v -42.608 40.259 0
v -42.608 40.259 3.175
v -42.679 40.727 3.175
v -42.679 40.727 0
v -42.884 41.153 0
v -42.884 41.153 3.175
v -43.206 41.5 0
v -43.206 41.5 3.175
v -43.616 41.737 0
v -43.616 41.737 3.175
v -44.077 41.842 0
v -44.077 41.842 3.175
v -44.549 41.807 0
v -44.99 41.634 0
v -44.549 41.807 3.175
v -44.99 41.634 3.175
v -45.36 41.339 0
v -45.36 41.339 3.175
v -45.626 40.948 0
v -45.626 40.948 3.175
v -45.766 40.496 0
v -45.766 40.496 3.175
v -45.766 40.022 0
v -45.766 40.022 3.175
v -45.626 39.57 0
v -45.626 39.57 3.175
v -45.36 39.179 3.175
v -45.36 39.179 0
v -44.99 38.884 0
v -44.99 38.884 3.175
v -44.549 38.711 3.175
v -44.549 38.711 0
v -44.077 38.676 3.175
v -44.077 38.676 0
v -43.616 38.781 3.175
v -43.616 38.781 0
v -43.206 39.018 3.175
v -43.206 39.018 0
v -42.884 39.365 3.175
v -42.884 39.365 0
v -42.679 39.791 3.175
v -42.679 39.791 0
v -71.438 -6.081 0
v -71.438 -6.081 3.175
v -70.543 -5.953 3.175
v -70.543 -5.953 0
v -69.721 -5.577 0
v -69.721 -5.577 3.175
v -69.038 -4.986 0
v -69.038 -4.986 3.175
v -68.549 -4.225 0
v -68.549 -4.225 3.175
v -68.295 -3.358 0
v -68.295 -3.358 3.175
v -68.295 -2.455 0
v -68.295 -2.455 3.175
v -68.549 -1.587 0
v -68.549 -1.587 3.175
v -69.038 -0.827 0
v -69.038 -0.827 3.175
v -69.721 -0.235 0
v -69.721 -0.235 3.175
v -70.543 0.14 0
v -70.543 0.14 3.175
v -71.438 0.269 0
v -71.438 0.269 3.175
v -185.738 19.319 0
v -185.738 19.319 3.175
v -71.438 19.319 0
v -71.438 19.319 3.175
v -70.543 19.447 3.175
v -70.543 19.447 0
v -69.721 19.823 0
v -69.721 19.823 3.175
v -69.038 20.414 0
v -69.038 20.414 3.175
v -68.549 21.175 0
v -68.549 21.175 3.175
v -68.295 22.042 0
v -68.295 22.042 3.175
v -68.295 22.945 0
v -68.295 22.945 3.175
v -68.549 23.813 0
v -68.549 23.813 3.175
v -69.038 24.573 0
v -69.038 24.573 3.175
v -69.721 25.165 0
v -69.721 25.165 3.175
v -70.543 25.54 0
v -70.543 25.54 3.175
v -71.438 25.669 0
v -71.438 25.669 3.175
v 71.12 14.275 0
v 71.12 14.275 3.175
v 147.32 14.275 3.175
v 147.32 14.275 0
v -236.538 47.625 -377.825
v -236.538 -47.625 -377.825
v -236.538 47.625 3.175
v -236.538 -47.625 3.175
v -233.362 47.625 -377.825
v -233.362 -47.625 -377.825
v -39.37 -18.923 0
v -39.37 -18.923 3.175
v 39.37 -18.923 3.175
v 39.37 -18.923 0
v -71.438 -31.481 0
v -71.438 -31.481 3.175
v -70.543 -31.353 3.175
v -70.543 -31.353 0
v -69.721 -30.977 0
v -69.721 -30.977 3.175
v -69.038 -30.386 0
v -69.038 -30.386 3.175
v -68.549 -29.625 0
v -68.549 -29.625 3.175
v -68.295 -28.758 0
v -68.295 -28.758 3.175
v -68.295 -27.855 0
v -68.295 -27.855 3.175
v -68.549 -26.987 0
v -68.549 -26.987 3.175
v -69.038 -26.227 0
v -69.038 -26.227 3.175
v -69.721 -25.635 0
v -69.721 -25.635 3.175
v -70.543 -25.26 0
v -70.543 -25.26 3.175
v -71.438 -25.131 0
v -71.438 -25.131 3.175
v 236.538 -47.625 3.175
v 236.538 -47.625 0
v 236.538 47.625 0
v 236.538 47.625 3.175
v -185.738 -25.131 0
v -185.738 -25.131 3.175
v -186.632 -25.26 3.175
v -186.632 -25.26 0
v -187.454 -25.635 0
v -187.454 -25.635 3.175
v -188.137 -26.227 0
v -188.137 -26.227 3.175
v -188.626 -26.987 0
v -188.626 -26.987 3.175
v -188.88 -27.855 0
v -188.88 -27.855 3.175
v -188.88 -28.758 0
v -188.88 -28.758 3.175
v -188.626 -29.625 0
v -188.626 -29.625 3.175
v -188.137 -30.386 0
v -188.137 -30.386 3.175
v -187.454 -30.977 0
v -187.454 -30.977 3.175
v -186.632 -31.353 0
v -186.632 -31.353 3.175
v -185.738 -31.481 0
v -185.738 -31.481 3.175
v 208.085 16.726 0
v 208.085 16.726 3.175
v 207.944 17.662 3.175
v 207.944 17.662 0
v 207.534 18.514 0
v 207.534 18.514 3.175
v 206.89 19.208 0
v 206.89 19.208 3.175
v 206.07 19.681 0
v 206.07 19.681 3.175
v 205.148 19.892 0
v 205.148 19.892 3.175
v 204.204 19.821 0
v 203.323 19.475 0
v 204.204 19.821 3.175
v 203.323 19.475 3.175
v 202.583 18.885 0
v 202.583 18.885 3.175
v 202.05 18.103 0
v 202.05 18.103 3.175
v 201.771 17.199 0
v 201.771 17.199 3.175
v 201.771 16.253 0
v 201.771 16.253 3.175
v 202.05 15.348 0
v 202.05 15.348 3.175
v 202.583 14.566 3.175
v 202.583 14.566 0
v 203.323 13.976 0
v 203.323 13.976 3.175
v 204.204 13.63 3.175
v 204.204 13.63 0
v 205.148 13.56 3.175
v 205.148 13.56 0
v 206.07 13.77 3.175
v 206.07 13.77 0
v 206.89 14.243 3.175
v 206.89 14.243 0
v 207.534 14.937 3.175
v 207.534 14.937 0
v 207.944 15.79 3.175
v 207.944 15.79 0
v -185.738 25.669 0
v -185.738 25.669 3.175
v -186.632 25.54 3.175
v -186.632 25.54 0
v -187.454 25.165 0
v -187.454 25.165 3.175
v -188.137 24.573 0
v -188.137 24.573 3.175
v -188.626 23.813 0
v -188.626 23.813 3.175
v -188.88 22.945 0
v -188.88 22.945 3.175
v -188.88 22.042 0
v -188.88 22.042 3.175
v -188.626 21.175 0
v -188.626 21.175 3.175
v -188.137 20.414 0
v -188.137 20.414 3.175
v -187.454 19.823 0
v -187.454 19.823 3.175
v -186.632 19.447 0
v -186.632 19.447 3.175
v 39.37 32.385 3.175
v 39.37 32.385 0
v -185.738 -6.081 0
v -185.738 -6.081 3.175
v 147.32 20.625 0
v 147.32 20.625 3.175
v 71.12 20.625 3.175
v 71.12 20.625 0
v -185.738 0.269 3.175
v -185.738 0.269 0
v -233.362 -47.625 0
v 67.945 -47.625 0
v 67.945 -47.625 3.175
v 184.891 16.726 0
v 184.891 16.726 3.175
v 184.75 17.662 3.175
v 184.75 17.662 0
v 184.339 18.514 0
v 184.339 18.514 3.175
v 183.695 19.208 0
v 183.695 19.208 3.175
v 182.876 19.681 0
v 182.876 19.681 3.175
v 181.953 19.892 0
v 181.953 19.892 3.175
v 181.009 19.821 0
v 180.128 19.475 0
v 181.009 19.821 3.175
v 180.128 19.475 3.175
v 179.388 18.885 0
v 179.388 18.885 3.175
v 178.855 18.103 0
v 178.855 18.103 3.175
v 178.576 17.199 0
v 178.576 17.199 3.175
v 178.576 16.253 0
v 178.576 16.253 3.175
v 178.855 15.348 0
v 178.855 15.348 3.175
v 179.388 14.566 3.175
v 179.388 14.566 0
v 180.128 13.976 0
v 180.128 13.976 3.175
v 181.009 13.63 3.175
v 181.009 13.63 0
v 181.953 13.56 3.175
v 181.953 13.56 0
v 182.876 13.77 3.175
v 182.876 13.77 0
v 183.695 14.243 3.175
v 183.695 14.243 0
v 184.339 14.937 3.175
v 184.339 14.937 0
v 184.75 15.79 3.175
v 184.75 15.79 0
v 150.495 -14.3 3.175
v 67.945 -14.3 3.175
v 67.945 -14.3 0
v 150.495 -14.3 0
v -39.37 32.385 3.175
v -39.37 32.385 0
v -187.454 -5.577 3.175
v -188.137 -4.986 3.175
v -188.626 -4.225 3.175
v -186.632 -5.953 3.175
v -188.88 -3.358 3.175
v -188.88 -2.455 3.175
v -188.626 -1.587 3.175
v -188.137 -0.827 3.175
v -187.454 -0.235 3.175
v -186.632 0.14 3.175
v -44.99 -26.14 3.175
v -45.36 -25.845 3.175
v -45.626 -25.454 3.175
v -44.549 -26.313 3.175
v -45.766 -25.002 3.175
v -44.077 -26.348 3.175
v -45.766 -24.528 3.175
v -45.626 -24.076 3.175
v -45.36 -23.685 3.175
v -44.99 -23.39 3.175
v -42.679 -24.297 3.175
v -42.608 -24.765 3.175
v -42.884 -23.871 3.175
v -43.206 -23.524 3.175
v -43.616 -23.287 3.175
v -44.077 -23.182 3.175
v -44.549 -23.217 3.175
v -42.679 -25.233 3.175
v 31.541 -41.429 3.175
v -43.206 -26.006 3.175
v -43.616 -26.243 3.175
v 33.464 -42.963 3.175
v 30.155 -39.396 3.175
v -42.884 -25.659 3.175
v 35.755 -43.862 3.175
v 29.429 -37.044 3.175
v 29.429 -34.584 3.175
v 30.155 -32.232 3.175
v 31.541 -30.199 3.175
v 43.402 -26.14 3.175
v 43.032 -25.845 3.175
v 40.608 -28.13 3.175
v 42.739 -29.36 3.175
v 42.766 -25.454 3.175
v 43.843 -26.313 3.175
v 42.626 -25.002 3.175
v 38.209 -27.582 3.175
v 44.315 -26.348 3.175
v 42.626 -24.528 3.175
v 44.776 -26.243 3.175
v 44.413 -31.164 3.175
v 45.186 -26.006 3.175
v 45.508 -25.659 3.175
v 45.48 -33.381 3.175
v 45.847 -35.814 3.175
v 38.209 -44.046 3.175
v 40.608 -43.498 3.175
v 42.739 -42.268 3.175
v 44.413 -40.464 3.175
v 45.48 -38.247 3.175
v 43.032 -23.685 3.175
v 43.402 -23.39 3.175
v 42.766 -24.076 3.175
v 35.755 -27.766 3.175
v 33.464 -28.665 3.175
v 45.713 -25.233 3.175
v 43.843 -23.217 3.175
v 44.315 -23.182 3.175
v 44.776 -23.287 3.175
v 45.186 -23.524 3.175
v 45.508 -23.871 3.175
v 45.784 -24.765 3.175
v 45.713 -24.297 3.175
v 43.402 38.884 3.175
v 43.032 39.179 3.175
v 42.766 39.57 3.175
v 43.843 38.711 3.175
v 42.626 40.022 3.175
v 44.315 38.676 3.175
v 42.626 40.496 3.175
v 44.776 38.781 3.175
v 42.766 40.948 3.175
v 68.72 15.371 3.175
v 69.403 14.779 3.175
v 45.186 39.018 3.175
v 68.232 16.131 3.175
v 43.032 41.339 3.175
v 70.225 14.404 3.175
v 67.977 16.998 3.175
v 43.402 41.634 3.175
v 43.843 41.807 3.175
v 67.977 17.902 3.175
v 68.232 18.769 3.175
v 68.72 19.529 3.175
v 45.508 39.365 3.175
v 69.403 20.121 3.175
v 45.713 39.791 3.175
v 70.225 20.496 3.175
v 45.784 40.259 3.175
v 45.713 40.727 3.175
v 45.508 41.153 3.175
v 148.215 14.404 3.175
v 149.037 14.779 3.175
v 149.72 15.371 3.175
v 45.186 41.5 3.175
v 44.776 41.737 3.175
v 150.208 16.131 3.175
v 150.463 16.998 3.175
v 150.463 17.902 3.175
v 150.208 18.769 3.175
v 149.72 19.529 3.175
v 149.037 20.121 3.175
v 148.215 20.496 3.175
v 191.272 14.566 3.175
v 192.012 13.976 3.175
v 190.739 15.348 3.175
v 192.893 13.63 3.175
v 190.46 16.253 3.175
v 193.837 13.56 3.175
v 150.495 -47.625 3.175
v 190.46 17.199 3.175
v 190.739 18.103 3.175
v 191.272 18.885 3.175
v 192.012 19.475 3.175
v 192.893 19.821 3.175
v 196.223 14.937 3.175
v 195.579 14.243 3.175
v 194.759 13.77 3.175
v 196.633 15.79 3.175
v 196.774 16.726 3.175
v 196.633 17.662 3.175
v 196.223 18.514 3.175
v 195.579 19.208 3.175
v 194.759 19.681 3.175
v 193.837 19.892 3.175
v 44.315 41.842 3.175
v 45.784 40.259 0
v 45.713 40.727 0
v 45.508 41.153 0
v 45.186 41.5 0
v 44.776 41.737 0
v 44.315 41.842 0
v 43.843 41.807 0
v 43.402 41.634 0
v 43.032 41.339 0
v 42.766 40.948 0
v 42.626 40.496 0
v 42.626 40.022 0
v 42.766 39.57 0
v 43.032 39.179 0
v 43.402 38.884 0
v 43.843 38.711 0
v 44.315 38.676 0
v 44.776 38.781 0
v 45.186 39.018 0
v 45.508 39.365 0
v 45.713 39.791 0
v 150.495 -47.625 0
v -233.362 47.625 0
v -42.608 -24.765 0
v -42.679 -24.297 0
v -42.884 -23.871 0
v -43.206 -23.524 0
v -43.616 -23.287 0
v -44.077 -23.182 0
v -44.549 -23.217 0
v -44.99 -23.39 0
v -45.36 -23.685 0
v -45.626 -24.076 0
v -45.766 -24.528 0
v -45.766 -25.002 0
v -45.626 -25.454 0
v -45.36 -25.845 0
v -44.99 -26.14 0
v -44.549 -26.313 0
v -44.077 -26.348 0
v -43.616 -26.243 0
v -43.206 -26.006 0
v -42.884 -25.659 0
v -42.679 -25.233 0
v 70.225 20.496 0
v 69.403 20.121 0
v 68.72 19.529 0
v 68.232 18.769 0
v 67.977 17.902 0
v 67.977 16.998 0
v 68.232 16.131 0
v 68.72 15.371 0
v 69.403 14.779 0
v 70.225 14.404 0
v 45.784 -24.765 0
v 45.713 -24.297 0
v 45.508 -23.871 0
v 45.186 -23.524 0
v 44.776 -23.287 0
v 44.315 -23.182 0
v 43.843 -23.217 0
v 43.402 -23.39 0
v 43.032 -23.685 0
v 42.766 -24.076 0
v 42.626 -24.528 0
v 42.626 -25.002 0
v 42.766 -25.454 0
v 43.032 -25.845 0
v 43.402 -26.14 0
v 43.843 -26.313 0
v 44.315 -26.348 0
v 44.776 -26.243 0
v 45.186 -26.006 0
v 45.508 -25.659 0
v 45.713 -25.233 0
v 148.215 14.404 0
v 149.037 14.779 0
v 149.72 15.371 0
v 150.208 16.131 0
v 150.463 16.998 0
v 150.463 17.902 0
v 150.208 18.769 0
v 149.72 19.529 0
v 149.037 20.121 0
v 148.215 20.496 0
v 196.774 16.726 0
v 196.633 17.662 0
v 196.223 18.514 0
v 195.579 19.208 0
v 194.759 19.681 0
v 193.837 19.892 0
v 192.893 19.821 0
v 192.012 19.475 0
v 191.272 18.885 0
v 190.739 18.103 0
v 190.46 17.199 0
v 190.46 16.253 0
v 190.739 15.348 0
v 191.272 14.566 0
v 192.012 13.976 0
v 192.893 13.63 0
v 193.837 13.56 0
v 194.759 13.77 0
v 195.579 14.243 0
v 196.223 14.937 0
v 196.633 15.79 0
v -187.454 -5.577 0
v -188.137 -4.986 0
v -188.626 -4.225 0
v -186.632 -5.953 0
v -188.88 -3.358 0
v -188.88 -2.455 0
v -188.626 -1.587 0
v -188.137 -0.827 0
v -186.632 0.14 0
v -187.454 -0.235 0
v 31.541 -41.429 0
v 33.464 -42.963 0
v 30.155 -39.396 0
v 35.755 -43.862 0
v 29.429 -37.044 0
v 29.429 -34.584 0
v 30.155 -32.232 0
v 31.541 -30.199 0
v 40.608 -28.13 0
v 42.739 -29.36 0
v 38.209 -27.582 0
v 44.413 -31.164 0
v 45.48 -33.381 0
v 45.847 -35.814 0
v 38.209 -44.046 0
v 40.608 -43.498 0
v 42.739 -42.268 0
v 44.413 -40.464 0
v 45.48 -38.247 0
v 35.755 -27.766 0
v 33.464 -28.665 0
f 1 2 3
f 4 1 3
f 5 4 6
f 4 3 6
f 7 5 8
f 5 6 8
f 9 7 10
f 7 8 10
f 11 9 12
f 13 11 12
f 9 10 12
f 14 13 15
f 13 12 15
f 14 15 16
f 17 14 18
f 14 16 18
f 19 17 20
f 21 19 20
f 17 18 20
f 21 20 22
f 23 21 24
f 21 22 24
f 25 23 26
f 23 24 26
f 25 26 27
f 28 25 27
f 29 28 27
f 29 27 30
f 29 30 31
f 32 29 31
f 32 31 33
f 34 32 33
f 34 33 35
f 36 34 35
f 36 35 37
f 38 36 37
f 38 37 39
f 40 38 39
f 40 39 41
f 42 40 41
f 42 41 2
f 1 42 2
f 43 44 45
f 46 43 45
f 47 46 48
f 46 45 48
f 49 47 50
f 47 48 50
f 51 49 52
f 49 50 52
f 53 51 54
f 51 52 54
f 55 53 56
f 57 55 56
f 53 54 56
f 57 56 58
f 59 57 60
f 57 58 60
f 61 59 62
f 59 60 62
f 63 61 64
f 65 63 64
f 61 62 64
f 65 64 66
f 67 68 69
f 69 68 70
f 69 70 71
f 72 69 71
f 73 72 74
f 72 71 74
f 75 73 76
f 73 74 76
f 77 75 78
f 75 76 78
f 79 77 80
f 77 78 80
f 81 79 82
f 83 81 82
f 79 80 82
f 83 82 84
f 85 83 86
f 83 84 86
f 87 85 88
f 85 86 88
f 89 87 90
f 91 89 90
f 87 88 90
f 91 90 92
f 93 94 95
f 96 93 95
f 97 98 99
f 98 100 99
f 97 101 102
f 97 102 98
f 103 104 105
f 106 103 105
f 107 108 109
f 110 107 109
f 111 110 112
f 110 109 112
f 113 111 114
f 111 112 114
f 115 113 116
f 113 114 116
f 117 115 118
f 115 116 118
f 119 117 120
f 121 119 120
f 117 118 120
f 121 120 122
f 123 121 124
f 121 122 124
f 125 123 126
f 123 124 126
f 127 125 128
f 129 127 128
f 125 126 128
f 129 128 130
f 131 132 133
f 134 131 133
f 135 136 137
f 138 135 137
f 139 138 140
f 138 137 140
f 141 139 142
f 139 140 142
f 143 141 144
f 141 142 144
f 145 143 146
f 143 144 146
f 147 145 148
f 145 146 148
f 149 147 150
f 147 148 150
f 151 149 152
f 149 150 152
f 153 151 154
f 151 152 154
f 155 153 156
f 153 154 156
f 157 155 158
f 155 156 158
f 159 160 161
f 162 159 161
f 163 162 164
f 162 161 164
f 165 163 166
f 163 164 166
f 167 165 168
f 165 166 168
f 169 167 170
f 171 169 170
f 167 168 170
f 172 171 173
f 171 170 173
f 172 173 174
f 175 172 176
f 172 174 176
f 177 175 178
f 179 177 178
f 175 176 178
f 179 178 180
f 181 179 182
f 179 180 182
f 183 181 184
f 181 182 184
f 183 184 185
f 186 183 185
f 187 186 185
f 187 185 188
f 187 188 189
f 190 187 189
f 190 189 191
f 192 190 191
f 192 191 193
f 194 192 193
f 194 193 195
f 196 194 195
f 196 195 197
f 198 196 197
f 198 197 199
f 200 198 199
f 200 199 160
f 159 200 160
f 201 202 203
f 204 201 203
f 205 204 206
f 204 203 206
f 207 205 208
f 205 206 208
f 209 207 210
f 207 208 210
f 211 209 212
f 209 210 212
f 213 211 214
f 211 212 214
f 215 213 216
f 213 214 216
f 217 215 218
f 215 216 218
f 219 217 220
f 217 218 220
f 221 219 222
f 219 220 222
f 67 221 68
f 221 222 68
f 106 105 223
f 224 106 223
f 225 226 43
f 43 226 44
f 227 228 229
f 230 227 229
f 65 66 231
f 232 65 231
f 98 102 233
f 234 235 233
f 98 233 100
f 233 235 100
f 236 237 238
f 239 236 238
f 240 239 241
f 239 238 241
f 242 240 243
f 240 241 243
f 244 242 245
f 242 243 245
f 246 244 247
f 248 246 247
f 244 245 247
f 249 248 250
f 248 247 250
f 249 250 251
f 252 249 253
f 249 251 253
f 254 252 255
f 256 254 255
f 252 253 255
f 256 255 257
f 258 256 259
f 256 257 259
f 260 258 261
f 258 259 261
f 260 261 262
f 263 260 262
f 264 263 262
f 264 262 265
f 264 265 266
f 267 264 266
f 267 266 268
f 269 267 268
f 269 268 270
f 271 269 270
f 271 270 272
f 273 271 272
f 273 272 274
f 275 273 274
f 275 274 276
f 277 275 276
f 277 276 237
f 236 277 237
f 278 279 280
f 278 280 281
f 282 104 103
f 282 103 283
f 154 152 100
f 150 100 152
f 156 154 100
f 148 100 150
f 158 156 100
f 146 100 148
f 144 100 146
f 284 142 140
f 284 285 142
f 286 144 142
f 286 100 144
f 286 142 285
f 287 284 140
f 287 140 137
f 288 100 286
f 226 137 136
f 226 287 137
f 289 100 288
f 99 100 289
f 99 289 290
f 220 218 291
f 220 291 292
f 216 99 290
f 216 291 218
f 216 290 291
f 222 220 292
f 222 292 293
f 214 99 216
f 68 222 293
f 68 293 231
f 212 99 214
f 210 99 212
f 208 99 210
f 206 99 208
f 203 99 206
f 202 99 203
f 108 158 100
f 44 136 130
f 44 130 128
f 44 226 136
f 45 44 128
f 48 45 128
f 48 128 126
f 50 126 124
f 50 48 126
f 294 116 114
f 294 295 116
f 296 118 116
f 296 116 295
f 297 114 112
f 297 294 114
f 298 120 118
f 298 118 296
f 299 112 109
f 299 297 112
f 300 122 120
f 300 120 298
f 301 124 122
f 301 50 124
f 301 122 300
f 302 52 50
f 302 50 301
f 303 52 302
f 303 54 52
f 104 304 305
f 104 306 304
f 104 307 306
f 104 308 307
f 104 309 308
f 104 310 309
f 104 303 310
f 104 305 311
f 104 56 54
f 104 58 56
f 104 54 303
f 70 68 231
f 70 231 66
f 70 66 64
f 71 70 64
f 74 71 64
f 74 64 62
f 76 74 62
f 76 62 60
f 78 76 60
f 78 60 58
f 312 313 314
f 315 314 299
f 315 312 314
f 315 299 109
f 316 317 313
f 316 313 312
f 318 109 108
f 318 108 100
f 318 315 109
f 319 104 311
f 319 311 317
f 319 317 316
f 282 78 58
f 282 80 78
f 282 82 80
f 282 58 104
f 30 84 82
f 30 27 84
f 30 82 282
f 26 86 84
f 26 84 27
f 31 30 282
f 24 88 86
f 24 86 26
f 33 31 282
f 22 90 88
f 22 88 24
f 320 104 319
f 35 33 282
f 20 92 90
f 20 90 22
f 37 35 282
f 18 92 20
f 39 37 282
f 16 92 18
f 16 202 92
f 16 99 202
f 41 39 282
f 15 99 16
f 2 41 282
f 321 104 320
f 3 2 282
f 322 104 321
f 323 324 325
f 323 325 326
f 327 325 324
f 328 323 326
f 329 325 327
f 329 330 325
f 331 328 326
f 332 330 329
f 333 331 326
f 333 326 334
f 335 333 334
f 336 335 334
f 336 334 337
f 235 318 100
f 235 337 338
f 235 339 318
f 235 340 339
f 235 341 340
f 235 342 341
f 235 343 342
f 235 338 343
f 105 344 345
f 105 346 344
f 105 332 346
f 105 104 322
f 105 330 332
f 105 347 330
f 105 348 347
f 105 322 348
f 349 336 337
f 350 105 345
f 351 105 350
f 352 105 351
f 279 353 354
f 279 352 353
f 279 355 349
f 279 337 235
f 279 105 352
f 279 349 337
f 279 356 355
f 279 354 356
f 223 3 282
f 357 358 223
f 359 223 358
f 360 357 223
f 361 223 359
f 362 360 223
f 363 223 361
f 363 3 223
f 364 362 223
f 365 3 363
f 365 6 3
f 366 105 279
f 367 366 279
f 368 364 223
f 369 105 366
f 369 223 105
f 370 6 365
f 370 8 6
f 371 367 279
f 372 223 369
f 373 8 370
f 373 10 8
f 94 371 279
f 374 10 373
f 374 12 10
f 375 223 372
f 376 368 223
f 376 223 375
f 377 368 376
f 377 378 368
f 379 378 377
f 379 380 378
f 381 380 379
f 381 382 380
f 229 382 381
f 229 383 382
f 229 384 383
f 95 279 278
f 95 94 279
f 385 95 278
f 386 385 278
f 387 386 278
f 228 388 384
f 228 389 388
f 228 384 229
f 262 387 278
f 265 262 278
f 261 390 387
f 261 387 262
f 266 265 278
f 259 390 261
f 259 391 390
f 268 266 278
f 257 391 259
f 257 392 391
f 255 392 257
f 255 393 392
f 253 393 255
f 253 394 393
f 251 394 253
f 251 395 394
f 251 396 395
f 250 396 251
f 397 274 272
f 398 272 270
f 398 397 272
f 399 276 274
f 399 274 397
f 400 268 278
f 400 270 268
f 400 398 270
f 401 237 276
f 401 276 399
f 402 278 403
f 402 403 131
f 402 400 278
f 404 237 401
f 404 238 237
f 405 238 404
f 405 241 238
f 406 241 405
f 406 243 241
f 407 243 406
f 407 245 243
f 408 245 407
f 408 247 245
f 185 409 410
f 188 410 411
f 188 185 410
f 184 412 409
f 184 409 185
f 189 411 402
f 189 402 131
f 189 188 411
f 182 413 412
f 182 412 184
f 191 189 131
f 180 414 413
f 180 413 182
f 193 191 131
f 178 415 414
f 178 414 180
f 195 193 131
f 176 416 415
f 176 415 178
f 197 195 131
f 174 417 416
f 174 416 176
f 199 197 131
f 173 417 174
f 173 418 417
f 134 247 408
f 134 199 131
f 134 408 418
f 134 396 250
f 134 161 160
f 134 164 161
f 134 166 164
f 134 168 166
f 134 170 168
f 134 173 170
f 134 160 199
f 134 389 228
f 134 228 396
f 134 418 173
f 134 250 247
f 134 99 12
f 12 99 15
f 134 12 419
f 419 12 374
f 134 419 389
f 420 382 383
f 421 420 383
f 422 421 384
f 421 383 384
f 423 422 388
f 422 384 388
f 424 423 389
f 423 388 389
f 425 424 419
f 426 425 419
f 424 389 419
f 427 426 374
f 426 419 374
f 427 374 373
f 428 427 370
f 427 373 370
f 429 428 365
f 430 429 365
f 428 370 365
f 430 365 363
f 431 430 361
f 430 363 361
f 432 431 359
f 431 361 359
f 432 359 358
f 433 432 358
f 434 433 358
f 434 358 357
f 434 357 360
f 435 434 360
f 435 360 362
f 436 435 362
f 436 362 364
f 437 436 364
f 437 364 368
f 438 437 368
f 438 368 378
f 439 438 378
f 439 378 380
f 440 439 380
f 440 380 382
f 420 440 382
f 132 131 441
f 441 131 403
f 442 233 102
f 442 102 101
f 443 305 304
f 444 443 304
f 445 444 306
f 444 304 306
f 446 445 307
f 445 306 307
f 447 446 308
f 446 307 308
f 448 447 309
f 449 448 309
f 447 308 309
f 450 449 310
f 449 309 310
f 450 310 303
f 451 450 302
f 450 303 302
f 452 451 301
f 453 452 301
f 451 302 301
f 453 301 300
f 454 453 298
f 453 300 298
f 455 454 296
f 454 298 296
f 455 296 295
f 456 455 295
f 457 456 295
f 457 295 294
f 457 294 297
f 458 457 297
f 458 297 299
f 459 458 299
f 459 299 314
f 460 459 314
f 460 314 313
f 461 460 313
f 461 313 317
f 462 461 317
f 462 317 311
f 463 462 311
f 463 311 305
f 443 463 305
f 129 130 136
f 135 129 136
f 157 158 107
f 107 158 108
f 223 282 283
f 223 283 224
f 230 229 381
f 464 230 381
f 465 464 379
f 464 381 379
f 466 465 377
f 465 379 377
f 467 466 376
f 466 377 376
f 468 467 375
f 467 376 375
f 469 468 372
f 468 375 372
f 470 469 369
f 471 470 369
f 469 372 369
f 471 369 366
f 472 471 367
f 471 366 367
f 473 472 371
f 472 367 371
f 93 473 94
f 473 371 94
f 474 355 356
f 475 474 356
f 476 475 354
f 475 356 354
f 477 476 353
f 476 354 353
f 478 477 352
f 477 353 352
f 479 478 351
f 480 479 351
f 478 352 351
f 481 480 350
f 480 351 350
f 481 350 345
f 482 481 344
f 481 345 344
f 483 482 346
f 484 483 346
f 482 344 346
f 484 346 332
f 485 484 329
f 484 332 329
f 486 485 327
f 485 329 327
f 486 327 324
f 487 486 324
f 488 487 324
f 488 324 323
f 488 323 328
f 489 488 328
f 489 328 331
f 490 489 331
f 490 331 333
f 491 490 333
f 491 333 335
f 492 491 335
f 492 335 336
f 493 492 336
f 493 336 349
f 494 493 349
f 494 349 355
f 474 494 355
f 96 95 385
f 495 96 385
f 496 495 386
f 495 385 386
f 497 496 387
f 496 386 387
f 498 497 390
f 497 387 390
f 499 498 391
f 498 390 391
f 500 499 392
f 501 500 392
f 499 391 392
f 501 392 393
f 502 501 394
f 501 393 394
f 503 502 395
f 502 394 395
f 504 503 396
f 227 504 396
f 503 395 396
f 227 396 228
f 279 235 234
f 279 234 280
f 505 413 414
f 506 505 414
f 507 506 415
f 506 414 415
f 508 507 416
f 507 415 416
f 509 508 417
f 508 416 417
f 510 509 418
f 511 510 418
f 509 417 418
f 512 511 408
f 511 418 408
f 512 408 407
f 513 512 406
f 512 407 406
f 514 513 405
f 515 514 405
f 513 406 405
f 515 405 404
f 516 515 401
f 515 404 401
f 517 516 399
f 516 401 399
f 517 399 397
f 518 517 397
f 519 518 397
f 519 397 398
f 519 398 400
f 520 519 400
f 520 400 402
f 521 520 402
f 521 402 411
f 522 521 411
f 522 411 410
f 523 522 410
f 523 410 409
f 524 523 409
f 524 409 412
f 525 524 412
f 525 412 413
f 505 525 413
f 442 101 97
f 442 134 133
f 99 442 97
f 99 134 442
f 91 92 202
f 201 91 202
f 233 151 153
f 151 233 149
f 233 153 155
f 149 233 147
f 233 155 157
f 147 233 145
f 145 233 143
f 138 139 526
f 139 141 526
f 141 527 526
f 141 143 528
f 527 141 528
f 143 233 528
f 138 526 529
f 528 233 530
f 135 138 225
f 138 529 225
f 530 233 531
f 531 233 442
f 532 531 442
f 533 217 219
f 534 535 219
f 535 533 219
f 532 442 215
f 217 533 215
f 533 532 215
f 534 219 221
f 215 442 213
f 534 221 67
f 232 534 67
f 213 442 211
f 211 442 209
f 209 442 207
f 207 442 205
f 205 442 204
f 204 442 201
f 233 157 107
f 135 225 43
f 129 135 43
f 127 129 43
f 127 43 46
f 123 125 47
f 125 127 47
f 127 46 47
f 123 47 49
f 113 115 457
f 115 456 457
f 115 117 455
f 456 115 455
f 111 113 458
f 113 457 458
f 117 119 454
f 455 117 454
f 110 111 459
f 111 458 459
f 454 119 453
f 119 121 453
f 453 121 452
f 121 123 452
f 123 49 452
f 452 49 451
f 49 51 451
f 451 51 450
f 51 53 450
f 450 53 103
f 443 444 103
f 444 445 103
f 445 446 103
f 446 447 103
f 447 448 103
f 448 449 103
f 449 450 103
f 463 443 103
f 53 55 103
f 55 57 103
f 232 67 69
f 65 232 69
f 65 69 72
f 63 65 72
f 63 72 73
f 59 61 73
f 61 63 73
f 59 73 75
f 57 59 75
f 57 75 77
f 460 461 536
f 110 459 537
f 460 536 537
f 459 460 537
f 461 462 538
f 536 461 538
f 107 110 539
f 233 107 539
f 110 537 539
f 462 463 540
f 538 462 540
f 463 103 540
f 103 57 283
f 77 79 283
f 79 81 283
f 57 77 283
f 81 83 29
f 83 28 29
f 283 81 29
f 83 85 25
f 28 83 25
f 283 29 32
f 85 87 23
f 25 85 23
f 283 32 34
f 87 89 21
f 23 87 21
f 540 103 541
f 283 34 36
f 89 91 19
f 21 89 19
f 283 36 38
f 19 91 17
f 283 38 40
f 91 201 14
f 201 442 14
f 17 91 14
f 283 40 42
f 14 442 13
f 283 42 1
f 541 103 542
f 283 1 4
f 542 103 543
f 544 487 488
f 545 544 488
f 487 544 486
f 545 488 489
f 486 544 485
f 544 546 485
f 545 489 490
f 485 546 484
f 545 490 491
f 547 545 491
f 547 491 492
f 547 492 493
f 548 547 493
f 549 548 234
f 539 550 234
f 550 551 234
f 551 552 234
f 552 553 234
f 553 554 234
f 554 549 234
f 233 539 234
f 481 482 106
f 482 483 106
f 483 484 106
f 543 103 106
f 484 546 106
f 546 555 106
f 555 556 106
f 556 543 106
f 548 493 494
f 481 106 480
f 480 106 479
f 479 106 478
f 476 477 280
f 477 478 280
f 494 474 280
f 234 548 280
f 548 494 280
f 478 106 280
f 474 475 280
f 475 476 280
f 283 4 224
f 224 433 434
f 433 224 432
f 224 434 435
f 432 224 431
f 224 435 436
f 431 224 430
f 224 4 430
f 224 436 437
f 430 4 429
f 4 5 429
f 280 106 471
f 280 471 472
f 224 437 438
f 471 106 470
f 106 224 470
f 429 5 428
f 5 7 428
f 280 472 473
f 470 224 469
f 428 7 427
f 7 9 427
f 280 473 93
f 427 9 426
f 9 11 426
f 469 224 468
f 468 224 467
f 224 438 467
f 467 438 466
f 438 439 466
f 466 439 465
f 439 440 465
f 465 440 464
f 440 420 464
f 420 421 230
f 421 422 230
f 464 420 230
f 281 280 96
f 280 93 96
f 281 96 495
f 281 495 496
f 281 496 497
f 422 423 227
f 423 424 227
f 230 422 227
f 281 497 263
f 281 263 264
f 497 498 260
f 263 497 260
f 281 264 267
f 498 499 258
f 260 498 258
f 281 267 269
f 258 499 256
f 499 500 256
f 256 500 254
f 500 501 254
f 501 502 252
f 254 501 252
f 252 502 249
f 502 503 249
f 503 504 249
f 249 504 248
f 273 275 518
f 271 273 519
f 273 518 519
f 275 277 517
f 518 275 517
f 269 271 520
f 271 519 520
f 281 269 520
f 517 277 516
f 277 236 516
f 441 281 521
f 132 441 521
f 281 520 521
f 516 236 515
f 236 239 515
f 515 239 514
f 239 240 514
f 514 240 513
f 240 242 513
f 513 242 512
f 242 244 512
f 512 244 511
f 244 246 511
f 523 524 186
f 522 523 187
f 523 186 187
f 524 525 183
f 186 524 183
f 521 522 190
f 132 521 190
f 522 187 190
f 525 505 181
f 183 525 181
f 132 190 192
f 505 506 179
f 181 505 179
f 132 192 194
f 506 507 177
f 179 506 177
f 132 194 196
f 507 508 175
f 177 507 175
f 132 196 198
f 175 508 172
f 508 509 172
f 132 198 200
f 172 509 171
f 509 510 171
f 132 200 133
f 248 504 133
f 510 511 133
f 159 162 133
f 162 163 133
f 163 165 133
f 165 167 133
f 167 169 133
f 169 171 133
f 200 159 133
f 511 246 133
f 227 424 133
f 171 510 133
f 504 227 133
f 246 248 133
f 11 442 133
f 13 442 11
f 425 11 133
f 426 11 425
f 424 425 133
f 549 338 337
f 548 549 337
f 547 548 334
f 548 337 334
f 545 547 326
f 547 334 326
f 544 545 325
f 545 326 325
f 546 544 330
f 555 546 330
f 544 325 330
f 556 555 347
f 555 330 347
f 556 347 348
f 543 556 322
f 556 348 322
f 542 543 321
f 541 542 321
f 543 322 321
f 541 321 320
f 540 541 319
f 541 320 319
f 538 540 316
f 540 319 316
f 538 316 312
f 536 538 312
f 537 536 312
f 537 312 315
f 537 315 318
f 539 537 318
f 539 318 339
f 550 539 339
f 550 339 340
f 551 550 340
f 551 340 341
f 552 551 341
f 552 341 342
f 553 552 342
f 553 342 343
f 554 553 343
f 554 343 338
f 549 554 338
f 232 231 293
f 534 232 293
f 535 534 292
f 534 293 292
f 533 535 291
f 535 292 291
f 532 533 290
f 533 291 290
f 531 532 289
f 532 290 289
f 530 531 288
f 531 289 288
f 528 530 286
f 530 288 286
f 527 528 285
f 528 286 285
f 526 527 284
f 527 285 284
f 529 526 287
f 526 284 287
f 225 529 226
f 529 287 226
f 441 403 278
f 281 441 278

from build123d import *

# Parameters (mm, degrees)
SKETCH1_W           = 473.075
SKETCH1_H           = 95.25
BOSS_EXTRUDE1_DEPTH = 3.175
SKETCH3_W           = 78.74
SKETCH3_H           = 51.308
CUT_EXTRUDE2_DEPTH  = 242.305221983
SKETCH4_R           = 8.255
CUT_EXTRUDE3_DEPTH  = 242.305221983
SKETCH5_R           = 1.5875
CUT_EXTRUDE4_DEPTH  = 242.305221983
SKETCH6_W           = 3.175
SKETCH6_H           = 95.25
BOSS_EXTRUDE2_DEPTH = 377.825
SKETCH8_W           = 82.55
SKETCH8_H           = 33.324907577
CUT_EXTRUDE6_DEPTH  = 29.464
SKETCH9_R           = 3.175
CUT_EXTRUDE7_DEPTH  = 451.975752709


with BuildPart() as part:
    # Sketch1 → Boss-Extrude1 (new body)
    with BuildSketch(Plane.XY):
        Rectangle(SKETCH1_W, SKETCH1_H)
    extrude(amount=BOSS_EXTRUDE1_DEPTH)

    # Sketch3 → Cut-Extrude2 (cut, through all)
    with BuildSketch(Plane.XY.offset(3.175)):
        with Locations((0, 6.731)):
            Rectangle(SKETCH3_W, SKETCH3_H)
    extrude(amount=-CUT_EXTRUDE2_DEPTH, mode=Mode.SUBTRACT)

    # Sketch4 → Cut-Extrude3 (cut, through all)
    with BuildSketch(Plane.XY.offset(3.175)):
        with Locations((37.592, -35.814)):
            Circle(SKETCH4_R)
    extrude(amount=-CUT_EXTRUDE3_DEPTH, mode=Mode.SUBTRACT)

    # Sketch5 → Cut-Extrude4 (cut, through all)
    with BuildSketch(Plane.XY.offset(3.175)):
        with Locations((-44.196, 40.259)):
            Circle(SKETCH5_R)
        with Locations((44.196, 40.259)):
            Circle(SKETCH5_R)
        with Locations((-44.196, -24.765)):
            Circle(SKETCH5_R)
        with Locations((44.196, -24.765)):
            Circle(SKETCH5_R)
    extrude(amount=-CUT_EXTRUDE4_DEPTH, mode=Mode.SUBTRACT)

    # Sketch6 → Boss-Extrude2 (add)
    with BuildSketch(Plane(origin=(0, 0, 0), x_dir=(-1, 0, 0), z_dir=(0, 0, -1))):
        with Locations((234.95, 0)):
            Rectangle(SKETCH6_W, SKETCH6_H)
    extrude(amount=BOSS_EXTRUDE2_DEPTH)

    # Sketch8 → Cut-Extrude6 (cut)
    with BuildSketch(Plane.XY.offset(3.175)):
        with Locations((109.22, -30.962546212)):
            Rectangle(SKETCH8_W, SKETCH8_H)
        with BuildLine():
            Line((71.12, 14.274907577), (147.32, 14.274907577))
            ThreePointArc((147.32, 14.274907577), (150.495, 17.449907577), (147.32, 20.624907577))
            Line((147.32, 20.624907577), (71.12, 20.624907577))
            ThreePointArc((71.12, 20.624907577), (67.945, 17.449907577), (71.12, 14.274907577))
        make_face()
        with BuildLine():
            Line((-185.7375, 19.318625561), (-71.4375, 19.318625561))
            ThreePointArc((-71.4375, 19.318625561), (-68.2625, 22.493625561), (-71.4375, 25.668625561))
            Line((-71.4375, 25.668625561), (-185.7375, 25.668625561))
            ThreePointArc((-185.7375, 25.668625561), (-188.9125, 22.493625561), (-185.7375, 19.318625561))
        make_face()
        with BuildLine():
            Line((-185.7375, -6.081374439), (-71.4375, -6.081374439))
            ThreePointArc((-71.4375, -6.081374439), (-68.2625, -2.906374439), (-71.4375, 0.268625561))
            Line((-71.4375, 0.268625561), (-185.7375, 0.268625561))
            ThreePointArc((-185.7375, 0.268625561), (-188.9125, -2.906374439), (-185.7375, -6.081374439))
        make_face()
        with BuildLine():
            Line((-185.7375, -31.481374439), (-71.4375, -31.481374439))
            ThreePointArc((-71.4375, -31.481374439), (-68.2625, -28.306374439), (-71.4375, -25.131374439))
            Line((-71.4375, -25.131374439), (-185.7375, -25.131374439))
            ThreePointArc((-185.7375, -25.131374439), (-188.9125, -28.306374439), (-185.7375, -31.481374439))
        make_face()
    extrude(amount=-CUT_EXTRUDE6_DEPTH, mode=Mode.SUBTRACT)

    # Sketch9 → Cut-Extrude7 (cut, through all)
    with BuildSketch(Plane.XY.offset(3.175)):
        with Locations((181.715661459, 16.725735437)):
            Circle(SKETCH9_R)
        with Locations((193.599351225, 16.725735437)):
            Circle(SKETCH9_R)
        with Locations((204.910333051, 16.725735437)):
            Circle(SKETCH9_R)
    extrude(amount=-CUT_EXTRUDE7_DEPTH, mode=Mode.SUBTRACT)


solid = part.part
